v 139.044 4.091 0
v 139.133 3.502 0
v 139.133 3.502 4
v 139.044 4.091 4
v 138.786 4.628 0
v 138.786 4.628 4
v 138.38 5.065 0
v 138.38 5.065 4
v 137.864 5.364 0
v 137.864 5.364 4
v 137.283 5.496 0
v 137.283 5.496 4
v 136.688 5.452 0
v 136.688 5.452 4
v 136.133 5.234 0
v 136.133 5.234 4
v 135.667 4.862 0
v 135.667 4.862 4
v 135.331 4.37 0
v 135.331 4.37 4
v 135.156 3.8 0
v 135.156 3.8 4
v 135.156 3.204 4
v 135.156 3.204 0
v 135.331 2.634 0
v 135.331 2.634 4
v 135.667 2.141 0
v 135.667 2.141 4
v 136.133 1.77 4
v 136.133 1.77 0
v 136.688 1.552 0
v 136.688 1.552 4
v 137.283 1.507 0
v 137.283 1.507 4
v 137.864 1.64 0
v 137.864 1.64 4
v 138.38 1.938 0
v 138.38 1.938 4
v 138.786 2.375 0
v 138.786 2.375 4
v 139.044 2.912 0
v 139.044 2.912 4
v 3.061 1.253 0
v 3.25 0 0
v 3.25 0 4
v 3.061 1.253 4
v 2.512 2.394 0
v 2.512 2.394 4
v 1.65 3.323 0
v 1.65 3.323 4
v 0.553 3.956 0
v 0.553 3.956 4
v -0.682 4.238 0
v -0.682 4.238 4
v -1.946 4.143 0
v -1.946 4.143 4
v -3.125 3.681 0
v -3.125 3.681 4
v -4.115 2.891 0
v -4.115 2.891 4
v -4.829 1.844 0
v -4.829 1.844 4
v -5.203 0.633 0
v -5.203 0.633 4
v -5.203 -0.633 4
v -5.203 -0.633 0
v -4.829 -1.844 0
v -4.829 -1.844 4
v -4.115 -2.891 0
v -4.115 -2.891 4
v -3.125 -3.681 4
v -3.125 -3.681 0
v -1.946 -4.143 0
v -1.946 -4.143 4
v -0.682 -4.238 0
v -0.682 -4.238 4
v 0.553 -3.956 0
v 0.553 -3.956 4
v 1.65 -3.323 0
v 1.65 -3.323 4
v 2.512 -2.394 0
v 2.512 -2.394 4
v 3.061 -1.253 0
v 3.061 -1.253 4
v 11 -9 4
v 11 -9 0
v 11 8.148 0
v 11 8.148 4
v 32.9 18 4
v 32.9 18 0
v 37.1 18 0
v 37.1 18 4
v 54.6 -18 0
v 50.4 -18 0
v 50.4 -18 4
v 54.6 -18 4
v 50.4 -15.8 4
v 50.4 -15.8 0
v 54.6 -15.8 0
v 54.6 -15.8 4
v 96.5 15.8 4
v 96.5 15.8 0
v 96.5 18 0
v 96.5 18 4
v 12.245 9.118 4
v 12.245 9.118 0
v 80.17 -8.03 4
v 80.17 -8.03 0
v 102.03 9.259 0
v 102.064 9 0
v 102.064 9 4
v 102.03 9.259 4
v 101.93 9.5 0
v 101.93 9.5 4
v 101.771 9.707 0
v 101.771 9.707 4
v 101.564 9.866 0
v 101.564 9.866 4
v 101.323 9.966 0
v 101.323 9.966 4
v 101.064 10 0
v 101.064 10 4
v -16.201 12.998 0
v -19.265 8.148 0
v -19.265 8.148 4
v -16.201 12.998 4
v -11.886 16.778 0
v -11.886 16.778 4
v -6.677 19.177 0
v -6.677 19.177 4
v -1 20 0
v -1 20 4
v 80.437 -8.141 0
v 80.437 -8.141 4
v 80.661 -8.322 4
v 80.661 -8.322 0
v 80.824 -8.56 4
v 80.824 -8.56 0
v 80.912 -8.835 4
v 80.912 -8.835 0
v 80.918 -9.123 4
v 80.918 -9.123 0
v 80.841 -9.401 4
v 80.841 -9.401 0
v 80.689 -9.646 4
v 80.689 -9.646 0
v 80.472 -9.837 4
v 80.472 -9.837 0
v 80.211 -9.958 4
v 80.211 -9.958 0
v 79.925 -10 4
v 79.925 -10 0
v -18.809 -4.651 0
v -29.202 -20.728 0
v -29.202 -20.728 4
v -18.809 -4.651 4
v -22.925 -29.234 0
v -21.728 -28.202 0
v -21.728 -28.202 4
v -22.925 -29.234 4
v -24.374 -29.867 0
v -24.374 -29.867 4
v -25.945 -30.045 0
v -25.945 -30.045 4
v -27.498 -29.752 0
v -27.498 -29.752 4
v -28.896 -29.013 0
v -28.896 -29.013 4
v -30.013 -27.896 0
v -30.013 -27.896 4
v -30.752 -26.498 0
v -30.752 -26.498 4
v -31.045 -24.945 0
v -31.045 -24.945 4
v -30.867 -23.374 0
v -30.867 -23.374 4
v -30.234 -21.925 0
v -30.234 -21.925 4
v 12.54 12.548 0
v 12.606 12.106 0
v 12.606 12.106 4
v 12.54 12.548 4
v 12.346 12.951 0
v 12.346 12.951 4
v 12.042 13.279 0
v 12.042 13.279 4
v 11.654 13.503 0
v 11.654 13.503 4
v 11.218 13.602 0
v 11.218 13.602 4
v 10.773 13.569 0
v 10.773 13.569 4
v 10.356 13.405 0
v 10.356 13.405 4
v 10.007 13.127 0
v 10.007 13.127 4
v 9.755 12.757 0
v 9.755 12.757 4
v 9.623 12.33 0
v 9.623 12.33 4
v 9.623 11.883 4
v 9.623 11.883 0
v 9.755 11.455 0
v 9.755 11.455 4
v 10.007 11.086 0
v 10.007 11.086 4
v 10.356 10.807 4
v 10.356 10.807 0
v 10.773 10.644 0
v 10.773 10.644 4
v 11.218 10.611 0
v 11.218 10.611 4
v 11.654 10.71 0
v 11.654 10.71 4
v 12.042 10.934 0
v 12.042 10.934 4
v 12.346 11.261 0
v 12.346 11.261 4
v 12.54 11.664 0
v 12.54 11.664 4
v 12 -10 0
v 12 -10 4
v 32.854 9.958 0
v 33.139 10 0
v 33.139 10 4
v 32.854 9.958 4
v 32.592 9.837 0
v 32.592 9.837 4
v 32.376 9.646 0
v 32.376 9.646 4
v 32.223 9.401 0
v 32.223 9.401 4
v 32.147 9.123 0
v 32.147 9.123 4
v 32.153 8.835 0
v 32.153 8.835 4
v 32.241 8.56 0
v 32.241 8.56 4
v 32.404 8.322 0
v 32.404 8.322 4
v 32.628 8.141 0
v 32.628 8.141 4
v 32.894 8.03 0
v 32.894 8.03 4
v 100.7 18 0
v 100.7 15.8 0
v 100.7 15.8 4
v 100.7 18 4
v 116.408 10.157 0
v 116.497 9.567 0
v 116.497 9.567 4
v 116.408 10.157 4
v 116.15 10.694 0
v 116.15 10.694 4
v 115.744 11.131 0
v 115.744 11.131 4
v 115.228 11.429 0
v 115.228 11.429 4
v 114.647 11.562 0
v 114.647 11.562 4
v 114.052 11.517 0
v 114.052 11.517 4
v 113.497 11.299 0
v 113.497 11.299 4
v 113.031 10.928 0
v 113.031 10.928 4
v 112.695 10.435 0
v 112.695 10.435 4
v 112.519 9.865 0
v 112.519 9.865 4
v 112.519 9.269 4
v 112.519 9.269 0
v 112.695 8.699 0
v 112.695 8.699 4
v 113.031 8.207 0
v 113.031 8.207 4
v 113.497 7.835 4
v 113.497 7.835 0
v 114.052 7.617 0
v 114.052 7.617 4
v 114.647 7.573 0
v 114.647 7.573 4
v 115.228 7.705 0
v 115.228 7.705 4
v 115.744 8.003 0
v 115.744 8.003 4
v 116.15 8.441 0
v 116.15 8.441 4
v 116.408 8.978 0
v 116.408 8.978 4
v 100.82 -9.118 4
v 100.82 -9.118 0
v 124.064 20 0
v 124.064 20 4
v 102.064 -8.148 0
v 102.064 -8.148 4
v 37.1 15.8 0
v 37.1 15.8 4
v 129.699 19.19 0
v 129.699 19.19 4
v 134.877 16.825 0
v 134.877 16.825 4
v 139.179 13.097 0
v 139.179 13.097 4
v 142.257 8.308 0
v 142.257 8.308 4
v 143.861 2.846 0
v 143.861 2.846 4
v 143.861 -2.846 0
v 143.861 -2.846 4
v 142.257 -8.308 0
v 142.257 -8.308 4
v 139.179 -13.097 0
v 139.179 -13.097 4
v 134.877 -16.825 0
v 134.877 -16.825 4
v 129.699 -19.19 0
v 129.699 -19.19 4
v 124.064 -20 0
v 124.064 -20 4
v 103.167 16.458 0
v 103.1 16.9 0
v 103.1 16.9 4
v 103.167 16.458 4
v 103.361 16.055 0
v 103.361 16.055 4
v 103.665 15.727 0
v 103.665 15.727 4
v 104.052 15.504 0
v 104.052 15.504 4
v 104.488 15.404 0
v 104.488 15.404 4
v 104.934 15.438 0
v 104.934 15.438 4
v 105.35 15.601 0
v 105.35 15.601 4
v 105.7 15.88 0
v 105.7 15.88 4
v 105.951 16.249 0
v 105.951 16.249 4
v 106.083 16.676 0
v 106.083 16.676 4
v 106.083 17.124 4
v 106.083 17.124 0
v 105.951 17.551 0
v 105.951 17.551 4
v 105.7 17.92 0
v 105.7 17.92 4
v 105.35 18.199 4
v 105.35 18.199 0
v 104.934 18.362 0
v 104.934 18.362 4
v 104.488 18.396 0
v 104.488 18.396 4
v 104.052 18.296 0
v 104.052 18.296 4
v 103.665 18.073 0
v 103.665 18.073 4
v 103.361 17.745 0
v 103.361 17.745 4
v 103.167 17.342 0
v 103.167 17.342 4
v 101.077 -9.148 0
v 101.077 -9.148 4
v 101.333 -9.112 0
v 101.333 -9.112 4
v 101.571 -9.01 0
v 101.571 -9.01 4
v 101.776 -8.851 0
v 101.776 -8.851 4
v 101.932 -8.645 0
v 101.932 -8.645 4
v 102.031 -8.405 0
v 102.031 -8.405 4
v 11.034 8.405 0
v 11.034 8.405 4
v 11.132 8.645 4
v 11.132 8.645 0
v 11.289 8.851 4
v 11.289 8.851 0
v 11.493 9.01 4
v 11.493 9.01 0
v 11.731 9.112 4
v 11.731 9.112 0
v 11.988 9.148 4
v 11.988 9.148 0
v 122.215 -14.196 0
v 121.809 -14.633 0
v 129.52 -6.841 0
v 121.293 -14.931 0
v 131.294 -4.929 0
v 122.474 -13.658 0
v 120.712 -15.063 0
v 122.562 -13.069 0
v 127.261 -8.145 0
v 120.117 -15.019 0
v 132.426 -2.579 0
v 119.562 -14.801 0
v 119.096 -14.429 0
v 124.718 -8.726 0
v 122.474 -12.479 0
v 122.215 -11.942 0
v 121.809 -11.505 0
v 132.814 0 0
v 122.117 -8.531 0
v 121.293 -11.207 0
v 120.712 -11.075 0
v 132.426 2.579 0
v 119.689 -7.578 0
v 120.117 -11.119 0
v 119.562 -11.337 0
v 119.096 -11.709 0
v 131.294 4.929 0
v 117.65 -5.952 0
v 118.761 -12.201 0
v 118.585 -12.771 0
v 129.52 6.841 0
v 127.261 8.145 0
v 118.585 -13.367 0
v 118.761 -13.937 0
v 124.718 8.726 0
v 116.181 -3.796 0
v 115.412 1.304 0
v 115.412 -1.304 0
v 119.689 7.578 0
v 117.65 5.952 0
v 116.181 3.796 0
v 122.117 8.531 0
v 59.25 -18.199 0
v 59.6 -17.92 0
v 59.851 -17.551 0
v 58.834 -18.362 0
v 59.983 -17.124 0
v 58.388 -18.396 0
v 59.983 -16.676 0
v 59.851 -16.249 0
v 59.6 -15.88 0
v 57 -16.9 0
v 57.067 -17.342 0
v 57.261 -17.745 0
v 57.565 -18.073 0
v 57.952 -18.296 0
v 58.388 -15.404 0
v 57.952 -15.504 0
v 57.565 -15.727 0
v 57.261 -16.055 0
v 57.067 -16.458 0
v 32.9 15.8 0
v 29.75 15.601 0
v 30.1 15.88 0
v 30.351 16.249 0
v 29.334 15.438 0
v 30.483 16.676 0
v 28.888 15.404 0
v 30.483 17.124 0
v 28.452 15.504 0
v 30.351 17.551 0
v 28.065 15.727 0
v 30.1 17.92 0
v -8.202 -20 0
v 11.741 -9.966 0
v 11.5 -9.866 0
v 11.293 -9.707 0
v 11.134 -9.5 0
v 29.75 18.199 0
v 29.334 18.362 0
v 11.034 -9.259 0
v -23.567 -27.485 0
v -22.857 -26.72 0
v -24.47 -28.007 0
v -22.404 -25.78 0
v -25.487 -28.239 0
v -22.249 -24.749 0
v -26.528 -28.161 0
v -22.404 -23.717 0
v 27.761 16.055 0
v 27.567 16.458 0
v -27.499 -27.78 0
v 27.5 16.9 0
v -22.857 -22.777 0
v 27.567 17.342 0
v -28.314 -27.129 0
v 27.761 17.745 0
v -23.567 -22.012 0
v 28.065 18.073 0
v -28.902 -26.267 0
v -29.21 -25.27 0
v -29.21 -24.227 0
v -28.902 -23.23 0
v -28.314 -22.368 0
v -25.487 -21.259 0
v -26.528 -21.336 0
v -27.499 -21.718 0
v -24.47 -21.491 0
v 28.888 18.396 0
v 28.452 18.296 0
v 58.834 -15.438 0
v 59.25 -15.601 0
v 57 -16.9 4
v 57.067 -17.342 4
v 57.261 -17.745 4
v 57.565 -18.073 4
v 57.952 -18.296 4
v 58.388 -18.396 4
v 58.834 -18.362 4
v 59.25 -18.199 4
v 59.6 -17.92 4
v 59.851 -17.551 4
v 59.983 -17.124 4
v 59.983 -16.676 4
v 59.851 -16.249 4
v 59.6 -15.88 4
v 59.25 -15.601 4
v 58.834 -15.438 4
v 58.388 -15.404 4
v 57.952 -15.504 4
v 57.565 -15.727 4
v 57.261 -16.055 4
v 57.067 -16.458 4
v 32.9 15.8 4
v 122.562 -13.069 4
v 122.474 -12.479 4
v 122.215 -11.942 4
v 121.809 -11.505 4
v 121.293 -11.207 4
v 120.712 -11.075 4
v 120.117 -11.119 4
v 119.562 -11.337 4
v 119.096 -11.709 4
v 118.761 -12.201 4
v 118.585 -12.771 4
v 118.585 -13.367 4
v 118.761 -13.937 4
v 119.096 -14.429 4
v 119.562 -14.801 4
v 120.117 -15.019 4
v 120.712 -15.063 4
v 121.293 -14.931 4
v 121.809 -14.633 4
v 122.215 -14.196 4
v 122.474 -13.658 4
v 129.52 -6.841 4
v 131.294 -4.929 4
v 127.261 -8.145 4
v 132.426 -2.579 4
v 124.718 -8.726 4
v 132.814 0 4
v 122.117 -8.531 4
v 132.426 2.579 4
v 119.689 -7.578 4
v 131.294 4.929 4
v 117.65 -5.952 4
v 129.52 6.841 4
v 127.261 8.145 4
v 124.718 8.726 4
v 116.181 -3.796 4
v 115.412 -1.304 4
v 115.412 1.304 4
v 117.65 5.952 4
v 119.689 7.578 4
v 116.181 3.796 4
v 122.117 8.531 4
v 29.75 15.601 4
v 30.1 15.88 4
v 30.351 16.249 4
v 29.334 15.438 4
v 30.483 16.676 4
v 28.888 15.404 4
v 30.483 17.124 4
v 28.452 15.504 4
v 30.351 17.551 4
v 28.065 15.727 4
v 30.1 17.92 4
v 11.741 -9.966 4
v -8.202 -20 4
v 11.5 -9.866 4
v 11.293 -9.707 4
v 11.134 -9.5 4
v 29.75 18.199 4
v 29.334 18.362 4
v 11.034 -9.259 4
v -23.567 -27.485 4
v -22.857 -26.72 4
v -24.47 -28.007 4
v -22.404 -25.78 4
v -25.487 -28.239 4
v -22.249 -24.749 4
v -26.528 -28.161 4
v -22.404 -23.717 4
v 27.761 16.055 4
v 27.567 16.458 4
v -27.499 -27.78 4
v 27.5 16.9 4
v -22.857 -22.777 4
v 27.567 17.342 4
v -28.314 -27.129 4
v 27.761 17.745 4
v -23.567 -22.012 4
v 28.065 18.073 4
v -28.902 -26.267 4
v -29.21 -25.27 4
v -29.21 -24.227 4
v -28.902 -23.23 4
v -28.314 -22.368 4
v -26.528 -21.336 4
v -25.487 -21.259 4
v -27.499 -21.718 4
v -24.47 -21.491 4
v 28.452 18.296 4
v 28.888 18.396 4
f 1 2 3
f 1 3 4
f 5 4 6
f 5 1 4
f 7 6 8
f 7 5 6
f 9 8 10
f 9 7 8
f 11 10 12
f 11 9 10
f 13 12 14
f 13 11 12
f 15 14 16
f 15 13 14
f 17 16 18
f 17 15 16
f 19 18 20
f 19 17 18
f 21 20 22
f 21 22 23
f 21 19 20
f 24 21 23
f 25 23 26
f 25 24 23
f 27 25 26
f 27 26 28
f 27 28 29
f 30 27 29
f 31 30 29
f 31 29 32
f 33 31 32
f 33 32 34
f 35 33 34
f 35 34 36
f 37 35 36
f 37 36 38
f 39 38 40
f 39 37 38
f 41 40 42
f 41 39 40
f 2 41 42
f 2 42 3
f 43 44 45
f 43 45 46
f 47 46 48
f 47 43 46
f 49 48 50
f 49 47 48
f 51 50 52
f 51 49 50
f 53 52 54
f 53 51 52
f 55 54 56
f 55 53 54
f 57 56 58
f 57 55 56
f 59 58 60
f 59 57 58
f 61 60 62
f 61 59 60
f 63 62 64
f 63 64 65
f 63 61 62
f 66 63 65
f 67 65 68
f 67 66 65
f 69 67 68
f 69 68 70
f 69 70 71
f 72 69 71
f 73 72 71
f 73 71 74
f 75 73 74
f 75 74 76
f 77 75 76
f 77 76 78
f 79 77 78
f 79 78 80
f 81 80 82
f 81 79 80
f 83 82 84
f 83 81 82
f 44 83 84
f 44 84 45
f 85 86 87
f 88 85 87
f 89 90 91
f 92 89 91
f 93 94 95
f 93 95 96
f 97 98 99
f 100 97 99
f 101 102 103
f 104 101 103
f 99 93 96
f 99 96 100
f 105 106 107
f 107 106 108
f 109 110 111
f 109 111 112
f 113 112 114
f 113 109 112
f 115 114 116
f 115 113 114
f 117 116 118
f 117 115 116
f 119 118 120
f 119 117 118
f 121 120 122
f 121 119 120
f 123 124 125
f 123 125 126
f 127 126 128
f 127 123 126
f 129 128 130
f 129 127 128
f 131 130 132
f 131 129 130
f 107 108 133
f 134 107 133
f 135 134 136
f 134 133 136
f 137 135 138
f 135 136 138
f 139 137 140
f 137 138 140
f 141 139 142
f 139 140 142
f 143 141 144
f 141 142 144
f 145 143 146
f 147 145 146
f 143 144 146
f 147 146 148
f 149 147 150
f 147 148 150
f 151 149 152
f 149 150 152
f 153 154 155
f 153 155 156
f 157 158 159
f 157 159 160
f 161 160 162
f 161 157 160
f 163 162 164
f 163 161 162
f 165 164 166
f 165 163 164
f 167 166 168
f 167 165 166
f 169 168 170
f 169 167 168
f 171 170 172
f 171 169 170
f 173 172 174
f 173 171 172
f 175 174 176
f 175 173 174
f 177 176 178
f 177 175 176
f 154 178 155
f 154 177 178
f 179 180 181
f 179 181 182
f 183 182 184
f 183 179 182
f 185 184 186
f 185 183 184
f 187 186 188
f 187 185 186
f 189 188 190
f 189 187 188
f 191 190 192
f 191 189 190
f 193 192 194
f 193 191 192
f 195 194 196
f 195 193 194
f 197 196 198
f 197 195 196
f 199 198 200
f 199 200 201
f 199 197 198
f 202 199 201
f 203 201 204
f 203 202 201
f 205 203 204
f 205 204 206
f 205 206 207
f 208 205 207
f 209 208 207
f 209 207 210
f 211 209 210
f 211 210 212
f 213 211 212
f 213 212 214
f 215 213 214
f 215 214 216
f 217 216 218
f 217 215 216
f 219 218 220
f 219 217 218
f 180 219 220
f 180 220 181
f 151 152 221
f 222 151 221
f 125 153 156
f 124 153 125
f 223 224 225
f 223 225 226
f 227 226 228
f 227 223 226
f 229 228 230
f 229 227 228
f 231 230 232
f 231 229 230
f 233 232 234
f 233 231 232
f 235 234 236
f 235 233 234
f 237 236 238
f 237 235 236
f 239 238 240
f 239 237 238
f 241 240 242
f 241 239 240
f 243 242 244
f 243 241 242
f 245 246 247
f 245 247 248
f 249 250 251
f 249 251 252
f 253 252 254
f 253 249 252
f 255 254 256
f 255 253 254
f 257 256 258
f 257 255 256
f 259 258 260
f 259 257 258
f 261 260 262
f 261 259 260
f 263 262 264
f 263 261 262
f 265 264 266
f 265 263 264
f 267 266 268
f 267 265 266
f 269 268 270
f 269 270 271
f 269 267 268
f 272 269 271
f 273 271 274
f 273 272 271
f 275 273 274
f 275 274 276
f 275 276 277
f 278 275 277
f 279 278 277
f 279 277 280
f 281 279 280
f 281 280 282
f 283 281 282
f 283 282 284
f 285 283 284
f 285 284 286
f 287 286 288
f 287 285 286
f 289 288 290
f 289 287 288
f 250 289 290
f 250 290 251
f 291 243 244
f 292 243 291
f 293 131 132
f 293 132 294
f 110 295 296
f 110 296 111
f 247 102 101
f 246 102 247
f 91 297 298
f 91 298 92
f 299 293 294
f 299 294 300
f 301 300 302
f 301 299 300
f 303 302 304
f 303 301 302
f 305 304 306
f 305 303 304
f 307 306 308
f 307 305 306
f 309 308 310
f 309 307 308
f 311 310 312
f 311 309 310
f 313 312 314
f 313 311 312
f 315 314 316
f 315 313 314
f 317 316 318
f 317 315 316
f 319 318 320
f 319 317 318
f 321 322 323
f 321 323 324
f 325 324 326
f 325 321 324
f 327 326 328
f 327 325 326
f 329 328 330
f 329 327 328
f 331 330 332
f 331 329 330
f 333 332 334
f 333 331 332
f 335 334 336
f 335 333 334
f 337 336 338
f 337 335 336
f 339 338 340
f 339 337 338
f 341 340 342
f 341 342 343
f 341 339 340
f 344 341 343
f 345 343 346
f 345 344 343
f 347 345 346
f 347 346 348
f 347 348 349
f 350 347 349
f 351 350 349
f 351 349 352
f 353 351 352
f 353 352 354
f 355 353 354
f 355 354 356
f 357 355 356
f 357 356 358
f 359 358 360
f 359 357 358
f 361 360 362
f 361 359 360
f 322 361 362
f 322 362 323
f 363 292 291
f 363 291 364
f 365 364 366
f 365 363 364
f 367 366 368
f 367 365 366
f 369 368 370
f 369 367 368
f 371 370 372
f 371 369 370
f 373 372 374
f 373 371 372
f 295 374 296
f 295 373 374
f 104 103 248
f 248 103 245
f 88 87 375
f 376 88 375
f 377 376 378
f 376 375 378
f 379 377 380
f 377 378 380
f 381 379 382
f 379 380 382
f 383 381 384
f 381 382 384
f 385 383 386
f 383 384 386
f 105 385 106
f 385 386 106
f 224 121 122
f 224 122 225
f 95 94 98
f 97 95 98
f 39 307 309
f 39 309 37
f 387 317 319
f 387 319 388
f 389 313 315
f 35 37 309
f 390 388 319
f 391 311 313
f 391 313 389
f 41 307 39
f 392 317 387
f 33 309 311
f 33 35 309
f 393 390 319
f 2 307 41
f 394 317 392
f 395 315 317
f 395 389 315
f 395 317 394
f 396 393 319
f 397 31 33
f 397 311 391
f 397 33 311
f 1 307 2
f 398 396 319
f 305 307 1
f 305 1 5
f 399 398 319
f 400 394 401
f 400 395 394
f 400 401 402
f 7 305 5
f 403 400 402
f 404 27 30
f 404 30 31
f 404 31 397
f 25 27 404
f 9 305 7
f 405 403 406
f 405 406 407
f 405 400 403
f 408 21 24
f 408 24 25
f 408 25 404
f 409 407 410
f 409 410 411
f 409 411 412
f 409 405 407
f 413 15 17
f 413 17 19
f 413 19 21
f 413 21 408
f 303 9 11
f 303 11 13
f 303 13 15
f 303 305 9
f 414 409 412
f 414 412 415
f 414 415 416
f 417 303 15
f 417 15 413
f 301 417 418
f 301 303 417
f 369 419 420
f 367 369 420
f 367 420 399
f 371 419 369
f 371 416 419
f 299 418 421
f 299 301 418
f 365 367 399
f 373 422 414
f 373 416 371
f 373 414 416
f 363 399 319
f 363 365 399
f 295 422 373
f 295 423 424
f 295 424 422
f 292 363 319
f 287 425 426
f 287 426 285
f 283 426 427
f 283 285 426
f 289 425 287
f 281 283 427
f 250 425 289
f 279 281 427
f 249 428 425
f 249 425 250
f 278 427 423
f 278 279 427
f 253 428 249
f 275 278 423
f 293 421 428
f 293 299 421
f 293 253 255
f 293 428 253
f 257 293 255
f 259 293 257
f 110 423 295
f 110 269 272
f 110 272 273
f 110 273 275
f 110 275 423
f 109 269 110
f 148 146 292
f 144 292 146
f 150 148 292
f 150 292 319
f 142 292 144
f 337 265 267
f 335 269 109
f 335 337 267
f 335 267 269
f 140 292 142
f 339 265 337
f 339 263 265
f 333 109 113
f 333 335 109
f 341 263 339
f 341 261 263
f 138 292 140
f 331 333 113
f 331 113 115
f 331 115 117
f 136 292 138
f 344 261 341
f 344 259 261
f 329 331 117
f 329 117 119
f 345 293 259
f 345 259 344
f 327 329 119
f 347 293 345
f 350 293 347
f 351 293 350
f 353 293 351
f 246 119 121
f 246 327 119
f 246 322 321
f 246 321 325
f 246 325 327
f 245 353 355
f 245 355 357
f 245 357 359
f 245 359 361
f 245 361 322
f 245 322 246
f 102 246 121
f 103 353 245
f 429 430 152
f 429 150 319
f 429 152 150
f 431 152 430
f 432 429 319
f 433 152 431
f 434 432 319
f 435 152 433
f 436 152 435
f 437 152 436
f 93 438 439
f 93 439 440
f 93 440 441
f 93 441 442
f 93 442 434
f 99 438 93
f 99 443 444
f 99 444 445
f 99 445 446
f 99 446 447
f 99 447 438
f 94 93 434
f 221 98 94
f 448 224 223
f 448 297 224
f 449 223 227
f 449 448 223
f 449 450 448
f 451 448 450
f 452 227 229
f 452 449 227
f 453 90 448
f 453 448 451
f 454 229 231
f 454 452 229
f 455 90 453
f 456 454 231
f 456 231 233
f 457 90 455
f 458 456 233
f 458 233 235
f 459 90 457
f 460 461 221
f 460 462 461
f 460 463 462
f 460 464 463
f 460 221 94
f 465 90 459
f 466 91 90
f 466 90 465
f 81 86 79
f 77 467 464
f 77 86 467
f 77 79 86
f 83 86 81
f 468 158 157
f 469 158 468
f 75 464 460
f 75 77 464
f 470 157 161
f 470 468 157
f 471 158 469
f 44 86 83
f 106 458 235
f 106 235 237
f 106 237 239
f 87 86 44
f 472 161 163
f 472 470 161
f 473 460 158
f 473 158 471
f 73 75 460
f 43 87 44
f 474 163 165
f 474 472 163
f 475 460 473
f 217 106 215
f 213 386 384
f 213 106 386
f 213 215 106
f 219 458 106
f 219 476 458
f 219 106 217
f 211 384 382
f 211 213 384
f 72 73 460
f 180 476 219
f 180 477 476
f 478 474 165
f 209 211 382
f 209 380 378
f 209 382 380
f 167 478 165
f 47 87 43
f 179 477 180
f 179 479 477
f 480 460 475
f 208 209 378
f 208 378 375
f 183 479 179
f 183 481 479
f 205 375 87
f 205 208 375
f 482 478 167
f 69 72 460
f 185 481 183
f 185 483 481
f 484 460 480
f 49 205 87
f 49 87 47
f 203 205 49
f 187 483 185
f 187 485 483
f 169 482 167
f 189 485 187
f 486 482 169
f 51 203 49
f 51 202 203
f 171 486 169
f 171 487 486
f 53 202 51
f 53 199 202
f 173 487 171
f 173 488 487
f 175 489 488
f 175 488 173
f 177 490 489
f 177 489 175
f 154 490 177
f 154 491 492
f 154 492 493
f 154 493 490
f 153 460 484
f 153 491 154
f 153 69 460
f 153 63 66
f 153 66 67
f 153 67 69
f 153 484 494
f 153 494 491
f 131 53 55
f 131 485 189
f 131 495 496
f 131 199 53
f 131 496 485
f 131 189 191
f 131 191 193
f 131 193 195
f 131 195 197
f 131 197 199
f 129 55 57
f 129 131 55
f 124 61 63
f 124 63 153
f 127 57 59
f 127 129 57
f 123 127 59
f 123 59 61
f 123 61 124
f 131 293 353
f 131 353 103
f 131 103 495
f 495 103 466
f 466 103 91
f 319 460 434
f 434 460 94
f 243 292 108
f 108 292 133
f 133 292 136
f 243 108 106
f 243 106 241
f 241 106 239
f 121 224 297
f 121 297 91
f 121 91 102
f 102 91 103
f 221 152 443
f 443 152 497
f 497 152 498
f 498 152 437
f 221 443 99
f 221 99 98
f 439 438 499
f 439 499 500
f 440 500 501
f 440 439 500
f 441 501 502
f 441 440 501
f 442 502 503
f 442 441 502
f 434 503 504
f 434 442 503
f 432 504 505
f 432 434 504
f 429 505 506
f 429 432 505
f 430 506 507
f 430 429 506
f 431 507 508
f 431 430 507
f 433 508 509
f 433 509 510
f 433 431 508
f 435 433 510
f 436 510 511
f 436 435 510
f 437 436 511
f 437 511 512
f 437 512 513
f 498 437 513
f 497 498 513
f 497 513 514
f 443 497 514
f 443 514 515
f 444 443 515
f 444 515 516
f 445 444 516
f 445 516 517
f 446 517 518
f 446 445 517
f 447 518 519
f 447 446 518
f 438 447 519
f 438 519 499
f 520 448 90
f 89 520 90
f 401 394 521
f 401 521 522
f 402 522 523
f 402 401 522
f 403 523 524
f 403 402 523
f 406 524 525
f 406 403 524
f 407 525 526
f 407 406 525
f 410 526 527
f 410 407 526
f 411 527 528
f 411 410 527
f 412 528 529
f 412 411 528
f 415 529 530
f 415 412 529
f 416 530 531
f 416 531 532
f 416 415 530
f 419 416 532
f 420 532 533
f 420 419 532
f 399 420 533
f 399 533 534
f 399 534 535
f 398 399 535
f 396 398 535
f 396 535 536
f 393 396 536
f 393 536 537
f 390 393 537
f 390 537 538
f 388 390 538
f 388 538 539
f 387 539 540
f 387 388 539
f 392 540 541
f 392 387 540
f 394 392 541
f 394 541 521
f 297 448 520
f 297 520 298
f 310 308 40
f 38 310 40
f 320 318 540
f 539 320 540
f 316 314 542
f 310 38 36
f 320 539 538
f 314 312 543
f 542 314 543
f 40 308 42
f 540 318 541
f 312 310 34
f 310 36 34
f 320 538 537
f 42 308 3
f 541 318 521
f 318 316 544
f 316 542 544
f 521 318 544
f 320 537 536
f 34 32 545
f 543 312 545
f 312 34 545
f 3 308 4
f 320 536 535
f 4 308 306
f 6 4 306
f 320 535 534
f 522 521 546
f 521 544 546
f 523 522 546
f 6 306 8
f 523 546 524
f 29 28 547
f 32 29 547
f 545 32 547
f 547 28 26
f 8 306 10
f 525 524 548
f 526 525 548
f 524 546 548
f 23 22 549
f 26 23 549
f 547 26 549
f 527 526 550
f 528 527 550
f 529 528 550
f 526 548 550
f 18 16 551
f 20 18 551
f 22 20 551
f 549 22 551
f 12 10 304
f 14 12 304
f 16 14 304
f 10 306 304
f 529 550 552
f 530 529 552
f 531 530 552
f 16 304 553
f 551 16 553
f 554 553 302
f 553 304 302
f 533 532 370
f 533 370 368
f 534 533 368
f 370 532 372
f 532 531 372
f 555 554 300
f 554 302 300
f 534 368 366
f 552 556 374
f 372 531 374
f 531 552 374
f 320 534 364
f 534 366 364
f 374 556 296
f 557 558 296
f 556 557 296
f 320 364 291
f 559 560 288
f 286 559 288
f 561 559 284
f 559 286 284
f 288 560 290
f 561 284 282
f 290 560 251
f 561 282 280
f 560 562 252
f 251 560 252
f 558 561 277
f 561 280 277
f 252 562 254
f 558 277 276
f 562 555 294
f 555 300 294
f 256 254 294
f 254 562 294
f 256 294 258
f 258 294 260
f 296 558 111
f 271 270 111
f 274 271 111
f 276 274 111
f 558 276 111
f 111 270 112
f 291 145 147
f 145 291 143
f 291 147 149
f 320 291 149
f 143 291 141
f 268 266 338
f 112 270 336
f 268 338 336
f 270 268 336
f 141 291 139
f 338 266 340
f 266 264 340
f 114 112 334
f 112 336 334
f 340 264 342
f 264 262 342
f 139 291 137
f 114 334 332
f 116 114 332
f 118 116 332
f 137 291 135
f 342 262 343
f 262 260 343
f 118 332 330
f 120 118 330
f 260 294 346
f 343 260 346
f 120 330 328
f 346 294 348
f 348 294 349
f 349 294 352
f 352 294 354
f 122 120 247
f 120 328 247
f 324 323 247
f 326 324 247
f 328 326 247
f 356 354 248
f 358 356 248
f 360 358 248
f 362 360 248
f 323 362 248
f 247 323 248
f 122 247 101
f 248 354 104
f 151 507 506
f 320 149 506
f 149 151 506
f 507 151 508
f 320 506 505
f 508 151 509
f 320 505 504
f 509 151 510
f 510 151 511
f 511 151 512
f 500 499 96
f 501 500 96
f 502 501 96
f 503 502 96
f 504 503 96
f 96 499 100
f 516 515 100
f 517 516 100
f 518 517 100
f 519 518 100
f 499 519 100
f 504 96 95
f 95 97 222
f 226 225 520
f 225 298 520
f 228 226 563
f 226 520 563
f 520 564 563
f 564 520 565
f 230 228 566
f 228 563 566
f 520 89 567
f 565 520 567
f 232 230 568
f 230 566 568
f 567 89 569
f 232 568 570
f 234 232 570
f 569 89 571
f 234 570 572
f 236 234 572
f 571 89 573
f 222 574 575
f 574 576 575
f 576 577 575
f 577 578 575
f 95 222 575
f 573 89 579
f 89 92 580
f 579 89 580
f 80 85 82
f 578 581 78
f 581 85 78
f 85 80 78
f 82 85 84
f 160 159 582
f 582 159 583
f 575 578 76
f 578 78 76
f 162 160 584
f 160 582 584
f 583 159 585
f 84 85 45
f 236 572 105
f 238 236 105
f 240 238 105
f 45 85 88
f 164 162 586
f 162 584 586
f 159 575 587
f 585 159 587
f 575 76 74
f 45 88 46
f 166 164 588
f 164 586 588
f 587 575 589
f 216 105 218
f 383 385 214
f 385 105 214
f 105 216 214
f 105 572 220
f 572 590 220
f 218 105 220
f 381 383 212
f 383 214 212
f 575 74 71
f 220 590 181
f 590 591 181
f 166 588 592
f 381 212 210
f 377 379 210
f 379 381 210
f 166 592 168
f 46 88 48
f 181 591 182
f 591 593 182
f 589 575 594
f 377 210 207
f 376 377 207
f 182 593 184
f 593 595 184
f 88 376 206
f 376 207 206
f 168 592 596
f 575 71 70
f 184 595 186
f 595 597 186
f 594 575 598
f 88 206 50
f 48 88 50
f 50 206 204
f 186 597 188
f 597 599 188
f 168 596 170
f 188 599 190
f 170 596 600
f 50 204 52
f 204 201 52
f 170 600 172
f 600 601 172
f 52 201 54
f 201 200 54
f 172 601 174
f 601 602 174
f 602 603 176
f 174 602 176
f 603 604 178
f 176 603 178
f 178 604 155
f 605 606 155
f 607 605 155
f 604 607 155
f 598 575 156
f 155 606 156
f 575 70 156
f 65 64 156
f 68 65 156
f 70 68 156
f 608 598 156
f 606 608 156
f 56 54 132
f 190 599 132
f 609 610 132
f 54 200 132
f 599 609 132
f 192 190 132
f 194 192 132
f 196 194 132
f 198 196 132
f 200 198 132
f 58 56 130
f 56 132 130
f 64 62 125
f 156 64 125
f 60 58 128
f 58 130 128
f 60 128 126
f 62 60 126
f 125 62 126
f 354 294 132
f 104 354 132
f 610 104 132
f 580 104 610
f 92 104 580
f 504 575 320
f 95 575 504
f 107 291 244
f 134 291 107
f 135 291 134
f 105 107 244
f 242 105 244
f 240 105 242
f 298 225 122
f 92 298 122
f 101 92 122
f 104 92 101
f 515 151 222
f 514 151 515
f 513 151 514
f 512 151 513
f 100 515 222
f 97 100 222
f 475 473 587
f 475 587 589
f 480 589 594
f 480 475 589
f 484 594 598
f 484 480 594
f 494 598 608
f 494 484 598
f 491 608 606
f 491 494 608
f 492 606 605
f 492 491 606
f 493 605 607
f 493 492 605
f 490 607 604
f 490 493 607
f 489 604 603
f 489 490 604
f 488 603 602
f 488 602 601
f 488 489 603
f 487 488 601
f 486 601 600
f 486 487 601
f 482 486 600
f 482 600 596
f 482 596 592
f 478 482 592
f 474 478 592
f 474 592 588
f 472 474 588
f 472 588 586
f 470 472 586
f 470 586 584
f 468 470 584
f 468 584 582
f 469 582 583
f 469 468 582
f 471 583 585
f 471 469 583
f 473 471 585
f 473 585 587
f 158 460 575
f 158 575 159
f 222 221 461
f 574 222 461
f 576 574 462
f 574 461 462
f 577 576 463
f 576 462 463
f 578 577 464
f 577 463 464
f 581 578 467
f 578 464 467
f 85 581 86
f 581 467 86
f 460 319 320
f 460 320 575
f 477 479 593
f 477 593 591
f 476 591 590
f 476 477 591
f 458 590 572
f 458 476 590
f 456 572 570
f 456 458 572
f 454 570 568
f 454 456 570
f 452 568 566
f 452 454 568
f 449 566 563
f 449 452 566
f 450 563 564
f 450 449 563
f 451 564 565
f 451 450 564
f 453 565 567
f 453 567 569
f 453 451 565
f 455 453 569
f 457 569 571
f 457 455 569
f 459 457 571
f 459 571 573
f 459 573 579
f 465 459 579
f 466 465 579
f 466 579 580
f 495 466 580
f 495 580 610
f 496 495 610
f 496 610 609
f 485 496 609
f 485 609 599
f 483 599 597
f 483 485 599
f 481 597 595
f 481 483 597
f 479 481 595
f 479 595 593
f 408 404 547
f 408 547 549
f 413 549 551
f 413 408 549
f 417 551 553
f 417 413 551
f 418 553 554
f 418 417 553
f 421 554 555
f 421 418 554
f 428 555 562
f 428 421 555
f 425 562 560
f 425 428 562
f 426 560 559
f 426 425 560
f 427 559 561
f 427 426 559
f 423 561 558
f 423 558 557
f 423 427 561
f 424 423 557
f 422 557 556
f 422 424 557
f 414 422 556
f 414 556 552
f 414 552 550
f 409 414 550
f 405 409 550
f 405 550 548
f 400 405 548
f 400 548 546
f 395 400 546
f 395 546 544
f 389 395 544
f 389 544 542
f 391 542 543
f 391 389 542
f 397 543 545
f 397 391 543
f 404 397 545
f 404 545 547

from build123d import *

# Parameters (mm, degrees)
SKETCH_1_R      = 4.25
SKETCH_1_R_2    = 8.75
SKETCH_1_R_3    = 2
SKETCH_1_R_4    = 1.5
SKETCH_1_R_5    = 3.5
SKETCH_1_W      = 4.2
SKETCH_1_H      = 2.2
EXTRUDE_1_DEPTH = 4


with BuildPart() as part:
    # 草图1 → 凸台-拉伸1 (new body)
    with BuildSketch(Plane.XY):
        with BuildLine():
            Line((-1, 20), (124.064295006, 20))
            ThreePointArc((124.064295006, 20), (144.064295006, 0), (124.064295006, -20))
            Line((124.064295006, -20), (10.014533743, -20))
            Line((10.014533743, -20), (-8.201544029, -20))
            Line((-8.201544029, -20), (-21.728077025, -28.201893958))
            ThreePointArc((-21.728077025, -28.201893958), (-29.496403282, -28.496403282), (-29.201893958, -20.728077025))
            Line((-29.201893958, -20.728077025), (-18.809358134, -4.651044611))
            Line((-18.809358134, -4.651044611), (-19.264777912, 8.14848991))
            ThreePointArc((-19.264777912, 8.14848991), (-11.886464114, 16.777511708), (-1, 20))
        make_face()
        with Locations((-1, 0)):
            Circle(SKETCH_1_R, mode=Mode.SUBTRACT)
        with Locations((124.064295006, 0)):
            Circle(SKETCH_1_R_2, mode=Mode.SUBTRACT)
        with Locations((114.497140256, 9.567154749)):
            Circle(SKETCH_1_R_3, mode=Mode.SUBTRACT)
        with Locations((137.133271435, 3.50182168)):
            Circle(SKETCH_1_R_3, mode=Mode.SUBTRACT)
        with Locations((120.562473325, -13.06897643)):
            Circle(SKETCH_1_R_3, mode=Mode.SUBTRACT)
        with Locations(Location((29, 16.9, 0), (0, 0, 180))):
            Circle(SKETCH_1_R_4, mode=Mode.SUBTRACT)
        with Locations(Location((104.6, 16.9, 0), (0, 0, 180))):
            Circle(SKETCH_1_R_4, mode=Mode.SUBTRACT)
        with Locations((-25.748737342, -24.748737342)):
            Circle(SKETCH_1_R_5, mode=Mode.SUBTRACT)
        with Locations((11.106307295, 12.106307295)):
            Circle(SKETCH_1_R_4, mode=Mode.SUBTRACT)
        with Locations(Location((58.5, -16.9, 0), (0, 0, 180))):
            Circle(SKETCH_1_R_4, mode=Mode.SUBTRACT)
        with BuildLine():
            Line((32.894135197, 8.030421477), (100.819514517, -9.118068433))
            ThreePointArc((100.819514517, -9.118068433), (101.678794604, -8.937407044), (102.064295006, -8.14848991))
            Line((102.064295006, -8.14848991), (102.064295006, 9))
            ThreePointArc((102.064295006, 9), (101.771401787, 9.707106781), (101.064295006, 10))
            Line((101.064295006, 10), (33.138915685, 10))
            ThreePointArc((33.138915685, 10), (32.146550197, 9.123331822), (32.894135197, 8.030421477))
        make_face(mode=Mode.SUBTRACT)
        with BuildLine():
            Line((12.244780488, 9.118068433), (80.170159809, -8.030421477))
            ThreePointArc((80.170159809, -8.030421477), (80.917744808, -9.123331822), (79.925379321, -10))
            Line((79.925379321, -10), (12, -10))
            ThreePointArc((12, -10), (11.292893219, -9.707106781), (11, -9))
            Line((11, -9), (11, 8.14848991))
            ThreePointArc((11, 8.14848991), (11.385500402, 8.937407044), (12.244780488, 9.118068433))
        make_face(mode=Mode.SUBTRACT)
        with Locations((35, 16.9)):
            Rectangle(SKETCH_1_W, SKETCH_1_H, mode=Mode.SUBTRACT)
        with Locations((98.6, 16.9)):
            Rectangle(SKETCH_1_W, SKETCH_1_H, mode=Mode.SUBTRACT)
        with Locations((52.5, -16.9)):
            Rectangle(SKETCH_1_W, SKETCH_1_H, mode=Mode.SUBTRACT)
    extrude(amount=EXTRUDE_1_DEPTH)


solid = part.part
